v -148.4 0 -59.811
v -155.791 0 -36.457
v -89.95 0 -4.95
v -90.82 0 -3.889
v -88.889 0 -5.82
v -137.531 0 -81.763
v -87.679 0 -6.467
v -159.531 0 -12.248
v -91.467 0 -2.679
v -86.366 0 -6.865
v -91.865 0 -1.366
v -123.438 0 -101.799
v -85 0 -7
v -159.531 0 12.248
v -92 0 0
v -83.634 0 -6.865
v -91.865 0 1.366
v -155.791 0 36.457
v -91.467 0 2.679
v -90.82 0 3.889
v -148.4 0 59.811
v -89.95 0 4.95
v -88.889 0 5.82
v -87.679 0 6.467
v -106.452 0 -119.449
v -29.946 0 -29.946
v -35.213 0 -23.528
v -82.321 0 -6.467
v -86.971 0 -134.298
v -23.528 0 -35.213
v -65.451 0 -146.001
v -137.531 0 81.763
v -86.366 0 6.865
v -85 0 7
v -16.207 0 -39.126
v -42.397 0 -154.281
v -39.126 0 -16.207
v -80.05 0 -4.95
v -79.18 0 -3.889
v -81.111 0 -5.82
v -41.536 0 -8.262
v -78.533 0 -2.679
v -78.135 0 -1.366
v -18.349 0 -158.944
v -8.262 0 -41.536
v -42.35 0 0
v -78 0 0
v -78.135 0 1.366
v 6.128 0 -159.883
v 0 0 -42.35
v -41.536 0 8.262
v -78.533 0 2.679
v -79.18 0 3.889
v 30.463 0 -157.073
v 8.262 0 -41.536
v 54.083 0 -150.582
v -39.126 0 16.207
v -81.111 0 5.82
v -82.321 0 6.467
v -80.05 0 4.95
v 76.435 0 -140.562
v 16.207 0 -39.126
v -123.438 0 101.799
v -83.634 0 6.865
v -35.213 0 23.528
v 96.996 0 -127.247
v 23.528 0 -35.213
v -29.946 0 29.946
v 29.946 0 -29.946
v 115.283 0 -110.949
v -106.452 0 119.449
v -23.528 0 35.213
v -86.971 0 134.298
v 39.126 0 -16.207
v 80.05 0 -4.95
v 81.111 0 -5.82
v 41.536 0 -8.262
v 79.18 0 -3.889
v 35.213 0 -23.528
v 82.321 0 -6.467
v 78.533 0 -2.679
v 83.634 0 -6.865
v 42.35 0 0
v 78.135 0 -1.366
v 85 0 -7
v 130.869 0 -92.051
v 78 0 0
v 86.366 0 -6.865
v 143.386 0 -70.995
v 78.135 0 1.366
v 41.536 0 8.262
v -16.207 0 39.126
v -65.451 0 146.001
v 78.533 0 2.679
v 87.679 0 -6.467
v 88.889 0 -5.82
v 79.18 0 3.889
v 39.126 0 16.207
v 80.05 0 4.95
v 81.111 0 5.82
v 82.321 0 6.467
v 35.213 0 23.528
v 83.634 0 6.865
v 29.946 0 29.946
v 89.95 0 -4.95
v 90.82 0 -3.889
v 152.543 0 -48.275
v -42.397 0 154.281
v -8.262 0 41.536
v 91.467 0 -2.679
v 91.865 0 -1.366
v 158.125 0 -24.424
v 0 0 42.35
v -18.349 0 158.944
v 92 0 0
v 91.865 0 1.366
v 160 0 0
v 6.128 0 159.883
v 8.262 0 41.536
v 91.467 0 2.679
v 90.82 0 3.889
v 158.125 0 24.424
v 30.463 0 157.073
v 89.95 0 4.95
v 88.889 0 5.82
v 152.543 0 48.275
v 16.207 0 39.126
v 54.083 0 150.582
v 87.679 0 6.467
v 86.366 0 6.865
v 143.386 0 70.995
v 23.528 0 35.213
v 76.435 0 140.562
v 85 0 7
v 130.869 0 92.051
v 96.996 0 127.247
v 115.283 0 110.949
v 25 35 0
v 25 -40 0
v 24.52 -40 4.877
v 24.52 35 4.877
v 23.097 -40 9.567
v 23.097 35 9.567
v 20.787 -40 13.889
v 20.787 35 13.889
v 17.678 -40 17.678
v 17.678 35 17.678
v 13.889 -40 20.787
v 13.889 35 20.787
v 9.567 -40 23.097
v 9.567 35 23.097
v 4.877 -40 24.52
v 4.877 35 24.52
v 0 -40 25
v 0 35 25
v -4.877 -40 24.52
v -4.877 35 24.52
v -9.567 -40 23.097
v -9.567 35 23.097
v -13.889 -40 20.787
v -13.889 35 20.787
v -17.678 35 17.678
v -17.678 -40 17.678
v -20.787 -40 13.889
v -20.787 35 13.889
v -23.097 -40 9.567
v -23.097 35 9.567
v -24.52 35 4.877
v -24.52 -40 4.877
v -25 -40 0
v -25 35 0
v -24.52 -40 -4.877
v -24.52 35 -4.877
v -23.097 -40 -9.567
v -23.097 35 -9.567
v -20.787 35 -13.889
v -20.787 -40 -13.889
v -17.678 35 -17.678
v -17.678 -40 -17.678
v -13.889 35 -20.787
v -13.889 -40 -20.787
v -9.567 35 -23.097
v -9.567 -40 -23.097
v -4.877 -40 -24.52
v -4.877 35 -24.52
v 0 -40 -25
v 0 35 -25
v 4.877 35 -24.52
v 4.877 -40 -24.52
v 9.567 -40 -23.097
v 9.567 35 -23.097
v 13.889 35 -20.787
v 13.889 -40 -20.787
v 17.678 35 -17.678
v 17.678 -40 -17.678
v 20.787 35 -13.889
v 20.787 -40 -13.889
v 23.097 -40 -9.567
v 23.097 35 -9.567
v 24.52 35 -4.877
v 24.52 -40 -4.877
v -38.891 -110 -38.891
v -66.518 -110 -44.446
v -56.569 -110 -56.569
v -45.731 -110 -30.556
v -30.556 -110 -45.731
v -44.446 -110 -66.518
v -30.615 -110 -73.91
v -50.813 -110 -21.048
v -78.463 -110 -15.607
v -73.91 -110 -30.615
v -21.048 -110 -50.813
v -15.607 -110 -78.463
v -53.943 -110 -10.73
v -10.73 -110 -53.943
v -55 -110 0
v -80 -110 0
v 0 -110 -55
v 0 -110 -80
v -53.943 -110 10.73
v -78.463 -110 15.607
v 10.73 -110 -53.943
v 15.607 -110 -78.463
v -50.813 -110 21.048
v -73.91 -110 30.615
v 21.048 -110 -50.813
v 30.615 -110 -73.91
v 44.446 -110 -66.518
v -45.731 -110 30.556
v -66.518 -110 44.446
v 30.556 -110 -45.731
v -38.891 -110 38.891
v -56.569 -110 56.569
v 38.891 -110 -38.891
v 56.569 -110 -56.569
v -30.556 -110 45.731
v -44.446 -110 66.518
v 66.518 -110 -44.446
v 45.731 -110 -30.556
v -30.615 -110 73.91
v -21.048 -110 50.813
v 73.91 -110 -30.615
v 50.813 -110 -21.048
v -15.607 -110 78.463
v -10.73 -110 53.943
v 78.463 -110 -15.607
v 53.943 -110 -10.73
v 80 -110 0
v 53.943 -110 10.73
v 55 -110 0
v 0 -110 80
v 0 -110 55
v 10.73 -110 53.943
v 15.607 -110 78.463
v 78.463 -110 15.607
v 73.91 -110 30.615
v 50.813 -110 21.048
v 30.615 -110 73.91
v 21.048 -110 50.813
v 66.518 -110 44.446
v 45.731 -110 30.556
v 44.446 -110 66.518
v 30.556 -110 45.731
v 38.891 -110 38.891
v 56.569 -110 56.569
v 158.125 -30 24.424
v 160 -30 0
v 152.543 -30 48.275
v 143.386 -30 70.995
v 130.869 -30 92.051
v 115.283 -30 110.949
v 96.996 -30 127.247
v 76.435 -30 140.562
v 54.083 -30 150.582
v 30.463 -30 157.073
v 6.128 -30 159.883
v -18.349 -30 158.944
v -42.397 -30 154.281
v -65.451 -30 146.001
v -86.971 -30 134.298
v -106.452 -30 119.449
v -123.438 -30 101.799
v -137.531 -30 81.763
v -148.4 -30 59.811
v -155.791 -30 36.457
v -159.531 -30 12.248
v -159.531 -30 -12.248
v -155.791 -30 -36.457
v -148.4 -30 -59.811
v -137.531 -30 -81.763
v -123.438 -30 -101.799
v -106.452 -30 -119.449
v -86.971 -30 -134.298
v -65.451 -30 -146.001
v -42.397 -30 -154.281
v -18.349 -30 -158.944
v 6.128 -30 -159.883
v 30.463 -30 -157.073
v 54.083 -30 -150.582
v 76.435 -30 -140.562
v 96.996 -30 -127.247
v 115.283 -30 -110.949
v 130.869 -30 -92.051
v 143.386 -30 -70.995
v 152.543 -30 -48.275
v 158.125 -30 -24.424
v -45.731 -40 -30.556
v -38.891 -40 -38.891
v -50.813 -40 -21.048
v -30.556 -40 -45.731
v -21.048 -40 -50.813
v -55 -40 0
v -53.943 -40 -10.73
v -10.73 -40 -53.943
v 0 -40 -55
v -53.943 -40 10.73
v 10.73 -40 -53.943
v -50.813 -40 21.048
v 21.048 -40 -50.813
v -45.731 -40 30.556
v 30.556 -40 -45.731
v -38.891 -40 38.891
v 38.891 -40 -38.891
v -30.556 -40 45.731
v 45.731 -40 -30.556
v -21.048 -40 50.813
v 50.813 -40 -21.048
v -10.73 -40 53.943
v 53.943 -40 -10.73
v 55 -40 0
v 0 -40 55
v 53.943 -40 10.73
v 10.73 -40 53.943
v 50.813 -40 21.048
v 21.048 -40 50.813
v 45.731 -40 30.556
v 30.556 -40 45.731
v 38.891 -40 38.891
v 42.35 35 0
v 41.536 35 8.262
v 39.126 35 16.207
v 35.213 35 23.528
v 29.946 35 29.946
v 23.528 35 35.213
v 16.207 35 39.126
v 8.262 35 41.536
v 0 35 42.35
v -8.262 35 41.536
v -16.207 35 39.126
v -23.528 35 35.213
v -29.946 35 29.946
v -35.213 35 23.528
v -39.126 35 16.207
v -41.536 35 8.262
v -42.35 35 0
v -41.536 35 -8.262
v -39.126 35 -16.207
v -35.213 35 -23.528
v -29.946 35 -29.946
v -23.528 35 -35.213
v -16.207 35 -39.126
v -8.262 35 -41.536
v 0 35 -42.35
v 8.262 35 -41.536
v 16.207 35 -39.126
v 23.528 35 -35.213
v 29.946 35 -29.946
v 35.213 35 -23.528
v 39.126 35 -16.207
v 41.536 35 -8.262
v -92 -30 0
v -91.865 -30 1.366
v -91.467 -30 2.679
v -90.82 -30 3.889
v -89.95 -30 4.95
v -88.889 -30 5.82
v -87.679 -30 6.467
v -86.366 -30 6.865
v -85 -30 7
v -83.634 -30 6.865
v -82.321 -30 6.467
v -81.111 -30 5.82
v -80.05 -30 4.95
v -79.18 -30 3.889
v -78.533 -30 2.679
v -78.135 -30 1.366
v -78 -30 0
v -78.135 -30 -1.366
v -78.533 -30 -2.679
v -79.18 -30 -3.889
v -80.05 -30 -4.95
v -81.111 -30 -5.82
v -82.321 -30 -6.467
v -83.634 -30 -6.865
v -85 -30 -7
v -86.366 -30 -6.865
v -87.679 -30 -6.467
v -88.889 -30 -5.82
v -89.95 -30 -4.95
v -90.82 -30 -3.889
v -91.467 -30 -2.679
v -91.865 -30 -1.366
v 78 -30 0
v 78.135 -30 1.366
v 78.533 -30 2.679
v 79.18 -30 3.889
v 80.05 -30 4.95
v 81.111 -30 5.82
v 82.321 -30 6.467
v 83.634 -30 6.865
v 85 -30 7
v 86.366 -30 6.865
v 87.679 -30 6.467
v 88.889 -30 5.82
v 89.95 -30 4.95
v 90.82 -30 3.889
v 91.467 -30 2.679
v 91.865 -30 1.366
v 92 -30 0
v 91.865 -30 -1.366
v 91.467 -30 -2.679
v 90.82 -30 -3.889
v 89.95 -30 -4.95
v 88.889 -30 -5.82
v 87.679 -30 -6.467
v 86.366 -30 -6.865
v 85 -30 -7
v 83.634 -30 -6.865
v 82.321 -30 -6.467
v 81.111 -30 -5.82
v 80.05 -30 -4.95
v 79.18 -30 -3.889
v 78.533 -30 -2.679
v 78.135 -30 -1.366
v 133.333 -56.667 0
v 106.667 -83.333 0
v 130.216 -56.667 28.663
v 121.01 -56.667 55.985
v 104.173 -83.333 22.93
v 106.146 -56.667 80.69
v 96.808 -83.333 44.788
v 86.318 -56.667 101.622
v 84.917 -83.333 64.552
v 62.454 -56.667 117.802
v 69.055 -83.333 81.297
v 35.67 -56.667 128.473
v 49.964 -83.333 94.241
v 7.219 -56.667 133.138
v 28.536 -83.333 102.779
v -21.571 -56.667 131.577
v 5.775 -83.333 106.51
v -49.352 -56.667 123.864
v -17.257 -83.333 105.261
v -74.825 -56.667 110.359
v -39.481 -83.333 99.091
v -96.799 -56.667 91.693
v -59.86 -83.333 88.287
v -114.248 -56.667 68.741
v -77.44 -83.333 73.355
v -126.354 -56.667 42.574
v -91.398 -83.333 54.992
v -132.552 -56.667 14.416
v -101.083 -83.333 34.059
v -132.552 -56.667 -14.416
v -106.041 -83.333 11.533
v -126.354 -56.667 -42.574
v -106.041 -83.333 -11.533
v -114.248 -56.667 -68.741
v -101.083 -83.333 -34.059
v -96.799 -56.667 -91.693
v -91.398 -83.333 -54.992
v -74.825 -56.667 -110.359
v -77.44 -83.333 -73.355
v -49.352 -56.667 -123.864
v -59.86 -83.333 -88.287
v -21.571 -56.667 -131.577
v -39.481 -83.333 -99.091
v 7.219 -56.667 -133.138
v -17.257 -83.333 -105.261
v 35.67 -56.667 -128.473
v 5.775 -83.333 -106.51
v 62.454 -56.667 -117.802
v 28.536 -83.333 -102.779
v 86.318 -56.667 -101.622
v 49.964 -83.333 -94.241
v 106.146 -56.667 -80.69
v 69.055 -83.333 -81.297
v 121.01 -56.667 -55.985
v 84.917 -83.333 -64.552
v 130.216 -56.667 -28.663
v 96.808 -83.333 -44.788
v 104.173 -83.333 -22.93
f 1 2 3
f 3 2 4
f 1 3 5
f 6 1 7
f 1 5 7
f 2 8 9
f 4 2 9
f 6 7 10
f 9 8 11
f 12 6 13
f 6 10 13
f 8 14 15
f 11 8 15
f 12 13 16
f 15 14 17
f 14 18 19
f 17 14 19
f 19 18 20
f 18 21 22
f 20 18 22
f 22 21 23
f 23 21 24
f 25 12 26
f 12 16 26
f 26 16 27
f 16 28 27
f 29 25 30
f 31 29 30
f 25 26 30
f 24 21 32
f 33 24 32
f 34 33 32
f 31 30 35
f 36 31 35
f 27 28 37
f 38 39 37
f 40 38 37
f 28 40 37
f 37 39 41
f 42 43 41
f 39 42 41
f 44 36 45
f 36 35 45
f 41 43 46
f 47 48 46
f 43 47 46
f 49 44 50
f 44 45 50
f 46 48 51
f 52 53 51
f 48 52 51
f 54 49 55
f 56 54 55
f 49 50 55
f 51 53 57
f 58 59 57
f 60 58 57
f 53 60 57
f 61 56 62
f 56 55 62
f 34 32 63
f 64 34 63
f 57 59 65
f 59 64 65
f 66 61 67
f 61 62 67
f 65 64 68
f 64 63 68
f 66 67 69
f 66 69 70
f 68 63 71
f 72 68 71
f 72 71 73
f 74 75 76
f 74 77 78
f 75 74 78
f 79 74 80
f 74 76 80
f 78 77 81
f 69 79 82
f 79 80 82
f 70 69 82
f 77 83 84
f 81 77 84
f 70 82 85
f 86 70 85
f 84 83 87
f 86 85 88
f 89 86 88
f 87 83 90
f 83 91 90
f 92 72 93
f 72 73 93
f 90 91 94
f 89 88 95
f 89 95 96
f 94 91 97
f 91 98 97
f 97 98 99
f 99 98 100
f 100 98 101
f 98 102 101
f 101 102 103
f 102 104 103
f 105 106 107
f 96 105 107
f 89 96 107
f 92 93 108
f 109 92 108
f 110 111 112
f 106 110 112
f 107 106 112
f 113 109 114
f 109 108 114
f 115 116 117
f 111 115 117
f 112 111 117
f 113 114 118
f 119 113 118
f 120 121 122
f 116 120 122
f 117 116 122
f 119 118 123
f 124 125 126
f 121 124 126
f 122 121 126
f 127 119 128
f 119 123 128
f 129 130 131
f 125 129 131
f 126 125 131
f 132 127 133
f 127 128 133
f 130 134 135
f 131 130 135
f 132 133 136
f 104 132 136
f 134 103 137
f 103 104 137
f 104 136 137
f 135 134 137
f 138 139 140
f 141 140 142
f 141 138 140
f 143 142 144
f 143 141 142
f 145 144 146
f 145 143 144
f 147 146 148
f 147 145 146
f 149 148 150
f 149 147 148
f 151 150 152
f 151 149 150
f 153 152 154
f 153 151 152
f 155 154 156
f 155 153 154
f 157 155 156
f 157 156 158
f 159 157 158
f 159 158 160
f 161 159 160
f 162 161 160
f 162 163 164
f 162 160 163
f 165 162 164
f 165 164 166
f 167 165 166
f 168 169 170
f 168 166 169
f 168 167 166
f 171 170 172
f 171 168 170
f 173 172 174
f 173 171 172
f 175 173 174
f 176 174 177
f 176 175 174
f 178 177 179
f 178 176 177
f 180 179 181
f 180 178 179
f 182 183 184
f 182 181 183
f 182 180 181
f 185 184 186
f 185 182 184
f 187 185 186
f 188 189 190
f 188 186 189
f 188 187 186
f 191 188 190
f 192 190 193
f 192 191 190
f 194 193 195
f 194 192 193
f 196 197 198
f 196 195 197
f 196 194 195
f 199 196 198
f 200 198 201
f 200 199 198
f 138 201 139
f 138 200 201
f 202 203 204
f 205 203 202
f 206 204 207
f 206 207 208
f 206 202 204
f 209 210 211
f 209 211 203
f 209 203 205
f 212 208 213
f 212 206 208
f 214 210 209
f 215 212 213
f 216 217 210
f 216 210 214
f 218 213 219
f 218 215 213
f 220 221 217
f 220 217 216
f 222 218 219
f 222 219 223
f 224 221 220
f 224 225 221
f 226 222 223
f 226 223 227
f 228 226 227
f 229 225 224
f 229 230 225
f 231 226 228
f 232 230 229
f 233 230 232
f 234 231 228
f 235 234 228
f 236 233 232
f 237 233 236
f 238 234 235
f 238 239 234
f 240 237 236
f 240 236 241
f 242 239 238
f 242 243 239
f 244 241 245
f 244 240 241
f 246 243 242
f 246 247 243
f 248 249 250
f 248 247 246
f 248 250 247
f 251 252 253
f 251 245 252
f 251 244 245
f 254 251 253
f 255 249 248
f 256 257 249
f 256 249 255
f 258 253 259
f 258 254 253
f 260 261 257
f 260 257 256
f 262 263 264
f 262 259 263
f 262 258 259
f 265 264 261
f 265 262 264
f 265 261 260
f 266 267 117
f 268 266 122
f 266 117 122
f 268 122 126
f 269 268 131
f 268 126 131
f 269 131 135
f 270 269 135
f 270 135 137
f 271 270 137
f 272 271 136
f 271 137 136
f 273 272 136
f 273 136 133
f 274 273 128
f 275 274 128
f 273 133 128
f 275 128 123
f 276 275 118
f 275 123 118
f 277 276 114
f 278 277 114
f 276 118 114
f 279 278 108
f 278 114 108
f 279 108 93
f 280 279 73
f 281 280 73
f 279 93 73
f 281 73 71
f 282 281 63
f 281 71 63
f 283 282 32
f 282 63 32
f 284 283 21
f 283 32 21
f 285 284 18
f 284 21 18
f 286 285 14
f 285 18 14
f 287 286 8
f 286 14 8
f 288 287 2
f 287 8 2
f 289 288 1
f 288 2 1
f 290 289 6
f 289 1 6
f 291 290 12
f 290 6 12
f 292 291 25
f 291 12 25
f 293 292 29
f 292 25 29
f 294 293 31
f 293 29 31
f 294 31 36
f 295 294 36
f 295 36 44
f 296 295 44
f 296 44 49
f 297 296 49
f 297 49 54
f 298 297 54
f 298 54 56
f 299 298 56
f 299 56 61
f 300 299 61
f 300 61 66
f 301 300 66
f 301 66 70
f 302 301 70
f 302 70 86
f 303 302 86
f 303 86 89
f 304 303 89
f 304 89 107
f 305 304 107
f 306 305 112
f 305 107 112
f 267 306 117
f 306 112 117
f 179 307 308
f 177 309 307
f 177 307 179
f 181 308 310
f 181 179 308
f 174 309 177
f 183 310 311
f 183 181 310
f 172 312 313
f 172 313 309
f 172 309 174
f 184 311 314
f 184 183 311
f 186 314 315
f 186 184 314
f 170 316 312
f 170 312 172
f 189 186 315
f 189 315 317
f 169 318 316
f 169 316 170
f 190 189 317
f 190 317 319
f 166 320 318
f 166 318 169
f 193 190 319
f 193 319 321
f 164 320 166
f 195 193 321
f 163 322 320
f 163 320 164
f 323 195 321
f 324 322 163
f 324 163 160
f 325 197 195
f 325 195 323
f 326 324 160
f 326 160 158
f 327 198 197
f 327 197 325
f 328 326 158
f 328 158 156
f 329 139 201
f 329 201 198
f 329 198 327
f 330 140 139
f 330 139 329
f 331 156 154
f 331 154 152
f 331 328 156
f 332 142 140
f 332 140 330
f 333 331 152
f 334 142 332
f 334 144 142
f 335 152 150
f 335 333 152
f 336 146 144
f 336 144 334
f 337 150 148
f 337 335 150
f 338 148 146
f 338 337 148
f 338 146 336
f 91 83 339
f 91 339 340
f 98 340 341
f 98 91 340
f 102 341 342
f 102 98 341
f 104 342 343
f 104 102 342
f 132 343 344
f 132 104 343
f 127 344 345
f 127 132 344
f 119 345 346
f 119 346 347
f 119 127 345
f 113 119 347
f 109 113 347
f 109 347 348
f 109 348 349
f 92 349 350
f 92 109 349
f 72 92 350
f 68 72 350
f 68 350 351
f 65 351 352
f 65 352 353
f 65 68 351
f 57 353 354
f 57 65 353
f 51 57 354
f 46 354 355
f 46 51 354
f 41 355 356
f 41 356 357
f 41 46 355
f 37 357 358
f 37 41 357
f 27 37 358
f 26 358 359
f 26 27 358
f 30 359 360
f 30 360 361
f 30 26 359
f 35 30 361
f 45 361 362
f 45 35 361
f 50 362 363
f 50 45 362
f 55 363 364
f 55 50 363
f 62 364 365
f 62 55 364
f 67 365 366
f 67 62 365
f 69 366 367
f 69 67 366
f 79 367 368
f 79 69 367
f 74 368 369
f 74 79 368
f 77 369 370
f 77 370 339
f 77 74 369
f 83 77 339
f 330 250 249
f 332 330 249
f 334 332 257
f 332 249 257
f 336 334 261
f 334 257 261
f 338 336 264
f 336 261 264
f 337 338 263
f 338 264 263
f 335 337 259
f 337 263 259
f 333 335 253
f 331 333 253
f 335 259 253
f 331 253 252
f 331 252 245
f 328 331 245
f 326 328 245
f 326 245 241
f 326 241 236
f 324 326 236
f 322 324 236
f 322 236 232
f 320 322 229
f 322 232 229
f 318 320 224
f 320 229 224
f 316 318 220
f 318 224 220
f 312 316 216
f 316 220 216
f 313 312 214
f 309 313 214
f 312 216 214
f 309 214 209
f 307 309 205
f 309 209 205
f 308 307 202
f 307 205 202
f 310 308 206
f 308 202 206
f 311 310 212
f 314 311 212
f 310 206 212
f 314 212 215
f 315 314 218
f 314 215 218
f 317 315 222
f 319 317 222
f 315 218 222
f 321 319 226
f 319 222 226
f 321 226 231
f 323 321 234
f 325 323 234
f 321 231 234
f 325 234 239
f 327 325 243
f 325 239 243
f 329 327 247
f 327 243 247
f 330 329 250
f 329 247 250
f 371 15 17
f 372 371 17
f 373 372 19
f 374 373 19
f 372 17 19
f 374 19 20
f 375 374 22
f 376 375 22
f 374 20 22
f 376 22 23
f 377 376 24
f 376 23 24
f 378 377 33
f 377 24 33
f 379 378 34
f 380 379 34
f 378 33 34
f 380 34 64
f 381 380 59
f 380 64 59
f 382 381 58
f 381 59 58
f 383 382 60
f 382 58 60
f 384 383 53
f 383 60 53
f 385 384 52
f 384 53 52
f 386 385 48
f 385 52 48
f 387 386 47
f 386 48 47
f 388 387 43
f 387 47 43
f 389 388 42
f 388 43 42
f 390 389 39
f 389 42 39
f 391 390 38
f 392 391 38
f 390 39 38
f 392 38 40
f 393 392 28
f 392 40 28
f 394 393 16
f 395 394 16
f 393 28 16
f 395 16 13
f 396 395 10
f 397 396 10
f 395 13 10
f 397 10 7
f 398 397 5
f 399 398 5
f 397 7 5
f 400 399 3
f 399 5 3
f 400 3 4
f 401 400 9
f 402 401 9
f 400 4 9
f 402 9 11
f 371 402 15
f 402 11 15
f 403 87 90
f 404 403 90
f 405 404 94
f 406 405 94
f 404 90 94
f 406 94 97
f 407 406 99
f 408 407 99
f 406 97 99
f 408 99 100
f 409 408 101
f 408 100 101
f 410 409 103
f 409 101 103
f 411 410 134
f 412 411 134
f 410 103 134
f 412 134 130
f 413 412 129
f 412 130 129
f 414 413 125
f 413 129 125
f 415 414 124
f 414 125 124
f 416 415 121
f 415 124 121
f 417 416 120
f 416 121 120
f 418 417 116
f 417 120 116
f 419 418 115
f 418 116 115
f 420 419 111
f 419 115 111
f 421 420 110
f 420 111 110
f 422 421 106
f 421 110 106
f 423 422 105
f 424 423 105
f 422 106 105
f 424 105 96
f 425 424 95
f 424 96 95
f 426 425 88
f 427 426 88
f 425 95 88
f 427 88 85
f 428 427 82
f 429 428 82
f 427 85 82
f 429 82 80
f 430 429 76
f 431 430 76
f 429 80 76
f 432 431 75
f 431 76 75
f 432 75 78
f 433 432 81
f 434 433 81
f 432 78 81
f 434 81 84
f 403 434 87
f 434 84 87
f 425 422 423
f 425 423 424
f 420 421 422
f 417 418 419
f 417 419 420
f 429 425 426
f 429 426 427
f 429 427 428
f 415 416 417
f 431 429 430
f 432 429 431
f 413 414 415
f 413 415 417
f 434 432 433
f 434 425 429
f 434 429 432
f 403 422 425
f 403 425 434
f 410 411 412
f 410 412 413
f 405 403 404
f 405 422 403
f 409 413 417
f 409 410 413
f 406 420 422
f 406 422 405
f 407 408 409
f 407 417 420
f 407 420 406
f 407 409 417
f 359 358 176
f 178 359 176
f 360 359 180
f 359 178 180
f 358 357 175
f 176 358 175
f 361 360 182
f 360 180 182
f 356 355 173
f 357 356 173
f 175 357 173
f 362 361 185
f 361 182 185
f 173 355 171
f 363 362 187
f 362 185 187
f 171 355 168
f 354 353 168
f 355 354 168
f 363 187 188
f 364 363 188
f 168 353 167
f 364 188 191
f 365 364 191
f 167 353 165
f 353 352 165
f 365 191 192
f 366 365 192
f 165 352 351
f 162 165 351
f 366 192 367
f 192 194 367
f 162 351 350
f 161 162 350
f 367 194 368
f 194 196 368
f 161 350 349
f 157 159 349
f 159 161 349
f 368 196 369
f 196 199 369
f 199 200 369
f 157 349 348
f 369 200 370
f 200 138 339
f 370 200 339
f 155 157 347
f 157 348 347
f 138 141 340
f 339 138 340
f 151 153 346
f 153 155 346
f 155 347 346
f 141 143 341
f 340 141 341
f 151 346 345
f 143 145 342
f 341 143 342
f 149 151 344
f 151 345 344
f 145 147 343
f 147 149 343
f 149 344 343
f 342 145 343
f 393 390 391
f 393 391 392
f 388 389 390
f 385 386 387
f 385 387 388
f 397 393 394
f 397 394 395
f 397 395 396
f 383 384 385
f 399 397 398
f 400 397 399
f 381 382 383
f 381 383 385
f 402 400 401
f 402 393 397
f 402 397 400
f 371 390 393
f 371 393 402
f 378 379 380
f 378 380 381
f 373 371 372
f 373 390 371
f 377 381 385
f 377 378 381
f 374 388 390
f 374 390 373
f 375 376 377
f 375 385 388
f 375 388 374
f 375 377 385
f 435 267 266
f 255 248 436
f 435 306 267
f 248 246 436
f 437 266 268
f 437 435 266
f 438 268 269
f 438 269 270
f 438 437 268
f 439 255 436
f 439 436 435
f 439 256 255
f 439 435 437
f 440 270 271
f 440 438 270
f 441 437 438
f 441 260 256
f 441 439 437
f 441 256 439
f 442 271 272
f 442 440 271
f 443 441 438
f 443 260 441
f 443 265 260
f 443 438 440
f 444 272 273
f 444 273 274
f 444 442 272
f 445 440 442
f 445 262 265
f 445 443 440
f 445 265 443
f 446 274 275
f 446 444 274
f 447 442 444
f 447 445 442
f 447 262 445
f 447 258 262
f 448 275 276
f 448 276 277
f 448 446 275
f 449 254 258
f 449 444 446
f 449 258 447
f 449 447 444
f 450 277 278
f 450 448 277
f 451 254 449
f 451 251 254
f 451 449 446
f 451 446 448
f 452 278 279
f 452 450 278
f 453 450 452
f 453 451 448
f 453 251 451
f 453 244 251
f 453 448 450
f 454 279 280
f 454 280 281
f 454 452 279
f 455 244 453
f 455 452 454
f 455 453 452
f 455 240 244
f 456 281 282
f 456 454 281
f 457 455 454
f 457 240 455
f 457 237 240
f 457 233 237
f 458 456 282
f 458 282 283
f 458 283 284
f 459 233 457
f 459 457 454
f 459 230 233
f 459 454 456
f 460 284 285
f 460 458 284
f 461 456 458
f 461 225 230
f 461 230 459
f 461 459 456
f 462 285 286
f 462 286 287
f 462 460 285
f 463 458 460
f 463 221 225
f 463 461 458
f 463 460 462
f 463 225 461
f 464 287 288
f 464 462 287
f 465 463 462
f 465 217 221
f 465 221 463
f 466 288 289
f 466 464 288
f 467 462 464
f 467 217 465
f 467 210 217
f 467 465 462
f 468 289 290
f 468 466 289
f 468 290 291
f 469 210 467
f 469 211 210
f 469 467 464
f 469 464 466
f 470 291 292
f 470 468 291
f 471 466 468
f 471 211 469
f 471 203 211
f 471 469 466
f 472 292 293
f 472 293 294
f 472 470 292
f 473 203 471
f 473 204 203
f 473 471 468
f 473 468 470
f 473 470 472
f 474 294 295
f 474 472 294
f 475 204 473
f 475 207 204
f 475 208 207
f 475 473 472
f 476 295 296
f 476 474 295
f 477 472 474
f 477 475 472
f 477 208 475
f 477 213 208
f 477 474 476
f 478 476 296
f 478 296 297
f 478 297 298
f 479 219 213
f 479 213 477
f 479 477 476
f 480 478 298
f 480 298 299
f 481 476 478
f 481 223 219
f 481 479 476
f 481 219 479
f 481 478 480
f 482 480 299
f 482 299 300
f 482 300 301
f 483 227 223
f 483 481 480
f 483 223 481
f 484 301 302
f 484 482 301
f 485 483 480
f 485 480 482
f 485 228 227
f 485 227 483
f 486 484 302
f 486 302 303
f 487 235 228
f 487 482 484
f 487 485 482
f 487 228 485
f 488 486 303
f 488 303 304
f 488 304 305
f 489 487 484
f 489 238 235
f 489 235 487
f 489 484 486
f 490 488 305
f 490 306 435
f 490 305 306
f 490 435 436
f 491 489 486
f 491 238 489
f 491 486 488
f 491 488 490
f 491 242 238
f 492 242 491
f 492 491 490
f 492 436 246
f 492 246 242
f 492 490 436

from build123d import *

# Parameters (mm, degrees)
F0_R     = 160
F0_R_2   = 50
F0_R_3   = 42.35
F0_R_4   = 25
F1_DEPTH = 110
F2_DEPTH = 35
F3_SIZE  = 80
F4_R     = 55
F5_DEPTH = 70
F6_R     = 7
F7_DEPTH = 30


with BuildPart() as f1:
    # F0 (on Front) → F1 (new body)
    with BuildSketch(Plane.XZ):
        Circle(F0_R)
        Circle(F0_R_2, mode=Mode.SUBTRACT)
        Circle(F0_R_2)
        Circle(F0_R_3, mode=Mode.SUBTRACT)
        Circle(F0_R_3)
        Circle(F0_R_4, mode=Mode.SUBTRACT)
    extrude(amount=F1_DEPTH)

    # F0 (on Front) → F2 (join)
    with BuildSketch(Plane.XZ):
        Circle(F0_R_3)
        Circle(F0_R_4, mode=Mode.SUBTRACT)
    extrude(amount=-F2_DEPTH)

    # F3
    f3_edges = [f1.edges().sort_by_distance(p)[0] for p in [
        (-160, -110, 0),
    ]]
    chamfer(f3_edges, length=F3_SIZE)

    # F4 (on face) → F5 (cut)
    with BuildSketch(Plane.XZ.offset(110)):
        Circle(F4_R)
    extrude(amount=-F5_DEPTH, mode=Mode.SUBTRACT)

    # F6 (on face) → F7 (cut)
    with BuildSketch(Plane(origin=(0, 0, 0), x_dir=(-1, 0, 0), z_dir=(0, 1, 0))):
        with Locations((-85, 0)):
            Circle(F6_R)
        with Locations((85, 0)):
            Circle(F6_R)
    extrude(amount=-F7_DEPTH, mode=Mode.SUBTRACT)


solid = f1.part
